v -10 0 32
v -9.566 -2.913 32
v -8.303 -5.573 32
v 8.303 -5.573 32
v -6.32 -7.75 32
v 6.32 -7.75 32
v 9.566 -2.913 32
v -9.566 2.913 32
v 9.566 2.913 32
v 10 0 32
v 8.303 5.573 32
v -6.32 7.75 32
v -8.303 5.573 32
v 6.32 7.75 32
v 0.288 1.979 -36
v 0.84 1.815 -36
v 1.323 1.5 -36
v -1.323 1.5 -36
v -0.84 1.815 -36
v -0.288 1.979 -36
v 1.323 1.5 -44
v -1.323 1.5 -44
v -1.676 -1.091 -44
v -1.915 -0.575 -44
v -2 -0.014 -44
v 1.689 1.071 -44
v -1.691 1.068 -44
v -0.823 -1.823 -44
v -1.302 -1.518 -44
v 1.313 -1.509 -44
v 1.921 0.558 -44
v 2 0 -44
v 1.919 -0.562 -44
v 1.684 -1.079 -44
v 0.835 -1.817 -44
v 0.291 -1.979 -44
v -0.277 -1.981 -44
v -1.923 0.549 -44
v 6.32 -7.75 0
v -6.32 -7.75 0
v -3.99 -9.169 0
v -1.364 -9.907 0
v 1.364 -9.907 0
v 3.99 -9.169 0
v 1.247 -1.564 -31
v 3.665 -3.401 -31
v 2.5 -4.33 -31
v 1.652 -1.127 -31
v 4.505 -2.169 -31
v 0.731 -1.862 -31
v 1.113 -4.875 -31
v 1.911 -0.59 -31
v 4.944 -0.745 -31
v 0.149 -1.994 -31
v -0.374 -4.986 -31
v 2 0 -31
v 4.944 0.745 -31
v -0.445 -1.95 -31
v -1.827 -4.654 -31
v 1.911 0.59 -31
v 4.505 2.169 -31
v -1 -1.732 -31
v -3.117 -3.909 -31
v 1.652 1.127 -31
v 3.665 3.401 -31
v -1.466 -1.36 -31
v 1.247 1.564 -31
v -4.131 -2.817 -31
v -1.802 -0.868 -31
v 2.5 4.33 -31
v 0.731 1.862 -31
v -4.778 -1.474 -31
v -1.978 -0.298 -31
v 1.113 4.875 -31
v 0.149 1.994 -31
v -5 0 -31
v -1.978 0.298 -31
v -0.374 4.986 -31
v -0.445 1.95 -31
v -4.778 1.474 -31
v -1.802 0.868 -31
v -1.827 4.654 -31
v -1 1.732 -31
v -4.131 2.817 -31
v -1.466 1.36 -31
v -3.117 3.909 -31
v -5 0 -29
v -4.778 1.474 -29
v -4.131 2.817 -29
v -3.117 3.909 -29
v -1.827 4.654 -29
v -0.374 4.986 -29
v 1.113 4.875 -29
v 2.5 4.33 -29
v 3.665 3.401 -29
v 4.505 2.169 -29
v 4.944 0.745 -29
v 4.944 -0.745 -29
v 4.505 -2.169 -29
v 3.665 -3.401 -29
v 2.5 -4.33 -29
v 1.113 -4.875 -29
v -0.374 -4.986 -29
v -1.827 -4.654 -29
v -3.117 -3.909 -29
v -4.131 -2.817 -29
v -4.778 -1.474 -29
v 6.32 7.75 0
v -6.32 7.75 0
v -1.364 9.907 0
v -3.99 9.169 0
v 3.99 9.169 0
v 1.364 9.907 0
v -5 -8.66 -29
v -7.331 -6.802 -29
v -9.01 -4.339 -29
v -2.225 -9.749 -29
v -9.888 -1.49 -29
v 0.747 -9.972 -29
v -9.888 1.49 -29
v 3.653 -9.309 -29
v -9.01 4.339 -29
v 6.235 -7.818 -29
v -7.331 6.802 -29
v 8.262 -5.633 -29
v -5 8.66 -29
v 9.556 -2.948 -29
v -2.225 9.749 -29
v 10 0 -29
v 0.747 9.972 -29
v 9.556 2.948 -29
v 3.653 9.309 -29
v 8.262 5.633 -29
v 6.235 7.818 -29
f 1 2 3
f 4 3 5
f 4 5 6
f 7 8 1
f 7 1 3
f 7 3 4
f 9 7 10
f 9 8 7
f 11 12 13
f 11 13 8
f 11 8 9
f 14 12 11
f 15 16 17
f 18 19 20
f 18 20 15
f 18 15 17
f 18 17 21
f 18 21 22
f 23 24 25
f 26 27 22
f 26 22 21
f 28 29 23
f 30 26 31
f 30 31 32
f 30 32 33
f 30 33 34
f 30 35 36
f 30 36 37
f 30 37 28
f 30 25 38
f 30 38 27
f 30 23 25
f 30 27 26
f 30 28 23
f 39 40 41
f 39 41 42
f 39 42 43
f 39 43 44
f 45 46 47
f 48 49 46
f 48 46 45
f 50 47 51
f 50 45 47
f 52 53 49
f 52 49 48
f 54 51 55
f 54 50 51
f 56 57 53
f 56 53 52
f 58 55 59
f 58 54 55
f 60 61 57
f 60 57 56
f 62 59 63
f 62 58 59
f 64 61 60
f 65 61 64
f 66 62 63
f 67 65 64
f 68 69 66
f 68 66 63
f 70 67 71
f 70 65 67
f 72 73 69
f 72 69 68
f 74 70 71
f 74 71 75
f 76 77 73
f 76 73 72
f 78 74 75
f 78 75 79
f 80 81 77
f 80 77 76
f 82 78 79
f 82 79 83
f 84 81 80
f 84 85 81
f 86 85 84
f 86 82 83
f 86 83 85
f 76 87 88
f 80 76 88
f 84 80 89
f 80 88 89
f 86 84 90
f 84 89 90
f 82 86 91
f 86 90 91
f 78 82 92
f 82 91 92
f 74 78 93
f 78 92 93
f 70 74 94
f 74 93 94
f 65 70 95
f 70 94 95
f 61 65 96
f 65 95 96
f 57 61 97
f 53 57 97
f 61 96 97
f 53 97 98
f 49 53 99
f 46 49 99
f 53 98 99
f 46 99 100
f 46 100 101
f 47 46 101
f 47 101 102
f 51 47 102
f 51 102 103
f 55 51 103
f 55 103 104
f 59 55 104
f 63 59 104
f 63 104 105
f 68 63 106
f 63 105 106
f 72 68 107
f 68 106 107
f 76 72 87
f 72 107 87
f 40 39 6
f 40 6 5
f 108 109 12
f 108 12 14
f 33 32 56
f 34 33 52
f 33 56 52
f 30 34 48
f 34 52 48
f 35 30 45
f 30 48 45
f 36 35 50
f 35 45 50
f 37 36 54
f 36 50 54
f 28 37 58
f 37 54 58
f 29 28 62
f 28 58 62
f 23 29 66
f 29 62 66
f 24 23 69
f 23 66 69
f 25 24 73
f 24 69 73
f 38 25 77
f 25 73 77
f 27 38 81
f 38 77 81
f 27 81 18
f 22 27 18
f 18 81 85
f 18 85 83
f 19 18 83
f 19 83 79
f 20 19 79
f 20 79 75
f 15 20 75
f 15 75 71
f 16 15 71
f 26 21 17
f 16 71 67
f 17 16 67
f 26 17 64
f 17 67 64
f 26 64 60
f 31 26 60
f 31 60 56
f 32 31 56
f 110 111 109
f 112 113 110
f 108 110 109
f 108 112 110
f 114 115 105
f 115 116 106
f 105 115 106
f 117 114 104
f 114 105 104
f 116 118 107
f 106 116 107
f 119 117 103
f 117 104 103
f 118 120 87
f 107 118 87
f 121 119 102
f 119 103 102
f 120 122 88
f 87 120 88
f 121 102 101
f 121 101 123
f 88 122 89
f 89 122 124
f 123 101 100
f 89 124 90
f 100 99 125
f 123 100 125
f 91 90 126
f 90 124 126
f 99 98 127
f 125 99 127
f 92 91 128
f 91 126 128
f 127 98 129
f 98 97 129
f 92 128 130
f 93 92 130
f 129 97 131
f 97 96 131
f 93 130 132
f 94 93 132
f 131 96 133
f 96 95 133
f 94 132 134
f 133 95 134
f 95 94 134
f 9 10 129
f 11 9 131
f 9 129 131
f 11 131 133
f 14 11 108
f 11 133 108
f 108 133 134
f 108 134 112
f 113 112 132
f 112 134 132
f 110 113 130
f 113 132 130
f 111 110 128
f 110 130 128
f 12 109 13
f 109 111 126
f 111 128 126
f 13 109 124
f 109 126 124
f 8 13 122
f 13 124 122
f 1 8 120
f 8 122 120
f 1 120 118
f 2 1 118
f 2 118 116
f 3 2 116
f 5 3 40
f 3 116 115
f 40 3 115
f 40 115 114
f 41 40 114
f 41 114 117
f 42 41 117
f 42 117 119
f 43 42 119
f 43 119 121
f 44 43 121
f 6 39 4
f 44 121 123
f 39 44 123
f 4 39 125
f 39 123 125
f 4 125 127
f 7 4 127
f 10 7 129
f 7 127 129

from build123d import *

# Parameters (mm, degrees)
BOSS_EXTRUDE1_DEPTH      = 32
BOSS_EXTRUDE1_DEPTH_BACK = 29
SKETCH1_R                = 10
CUT_EXTRUDE1_START       = -32
CUT_EXTRUDE1_DEPTH       = 32
SKETCH3_R                = 5
BOSS_EXTRUDE2_DEPTH      = 2
SKETCH4_R                = 2
BOSS_EXTRUDE3_DEPTH      = 13
CUT_EXTRUDE2_START       = -8
CUT_EXTRUDE2_DEPTH       = 8


with BuildPart() as part:
    # Sketch1 → Boss-Extrude1 (new, two sides: drawn at the far end of the back side and taken through both)
    with BuildSketch(Plane.XY.offset(-BOSS_EXTRUDE1_DEPTH_BACK)):
        Circle(SKETCH1_R)
    extrude(amount=BOSS_EXTRUDE1_DEPTH + BOSS_EXTRUDE1_DEPTH_BACK)

    # Sketch2 → Cut-Extrude1 (cut)
    with BuildSketch(Plane.XY.offset(32).offset(CUT_EXTRUDE1_START)):
        with BuildLine():
            Line((6.31961233, -7.75), (-6.31961233, -7.75))
            ThreePointArc((-6.31961233, -7.75), (0, -10), (6.31961233, -7.75))
        make_face()
        with BuildLine():
            ThreePointArc((6.31961233, 7.75), (0, 10), (-6.31961233, 7.75))
            Line((-6.31961233, 7.75), (6.31961233, 7.75))
        make_face()
    extrude(amount=CUT_EXTRUDE1_DEPTH, mode=Mode.SUBTRACT)

    # Sketch3 → Boss-Extrude2 (add)
    with BuildSketch(Plane(origin=(0, 0, -29), x_dir=(-1, 0, 0), z_dir=(0, 0, -1))):
        Circle(SKETCH3_R)
    extrude(amount=BOSS_EXTRUDE2_DEPTH)

    # Sketch4 → Boss-Extrude3 (add)
    with BuildSketch(Plane(origin=(0, 0, -31), x_dir=(-1, 0, 0), z_dir=(0, 0, -1))):
        with Locations(Location((0, 0, 0), (0, 0, 180))):
            Circle(SKETCH4_R)
    extrude(amount=BOSS_EXTRUDE3_DEPTH)

    # Sketch5 → Cut-Extrude2 (cut)
    with BuildSketch(Plane(origin=(0, 0, -44), x_dir=(-1, 0, 0), z_dir=(0, 0, -1)).offset(CUT_EXTRUDE2_START)):
        with BuildLine():
            Line((-1.322875656, 1.5), (1.322875656, 1.5))
            ThreePointArc((1.322875656, 1.5), (0, 2), (-1.322875656, 1.5))
        make_face()
    extrude(amount=CUT_EXTRUDE2_DEPTH, mode=Mode.SUBTRACT)


solid = part.part
